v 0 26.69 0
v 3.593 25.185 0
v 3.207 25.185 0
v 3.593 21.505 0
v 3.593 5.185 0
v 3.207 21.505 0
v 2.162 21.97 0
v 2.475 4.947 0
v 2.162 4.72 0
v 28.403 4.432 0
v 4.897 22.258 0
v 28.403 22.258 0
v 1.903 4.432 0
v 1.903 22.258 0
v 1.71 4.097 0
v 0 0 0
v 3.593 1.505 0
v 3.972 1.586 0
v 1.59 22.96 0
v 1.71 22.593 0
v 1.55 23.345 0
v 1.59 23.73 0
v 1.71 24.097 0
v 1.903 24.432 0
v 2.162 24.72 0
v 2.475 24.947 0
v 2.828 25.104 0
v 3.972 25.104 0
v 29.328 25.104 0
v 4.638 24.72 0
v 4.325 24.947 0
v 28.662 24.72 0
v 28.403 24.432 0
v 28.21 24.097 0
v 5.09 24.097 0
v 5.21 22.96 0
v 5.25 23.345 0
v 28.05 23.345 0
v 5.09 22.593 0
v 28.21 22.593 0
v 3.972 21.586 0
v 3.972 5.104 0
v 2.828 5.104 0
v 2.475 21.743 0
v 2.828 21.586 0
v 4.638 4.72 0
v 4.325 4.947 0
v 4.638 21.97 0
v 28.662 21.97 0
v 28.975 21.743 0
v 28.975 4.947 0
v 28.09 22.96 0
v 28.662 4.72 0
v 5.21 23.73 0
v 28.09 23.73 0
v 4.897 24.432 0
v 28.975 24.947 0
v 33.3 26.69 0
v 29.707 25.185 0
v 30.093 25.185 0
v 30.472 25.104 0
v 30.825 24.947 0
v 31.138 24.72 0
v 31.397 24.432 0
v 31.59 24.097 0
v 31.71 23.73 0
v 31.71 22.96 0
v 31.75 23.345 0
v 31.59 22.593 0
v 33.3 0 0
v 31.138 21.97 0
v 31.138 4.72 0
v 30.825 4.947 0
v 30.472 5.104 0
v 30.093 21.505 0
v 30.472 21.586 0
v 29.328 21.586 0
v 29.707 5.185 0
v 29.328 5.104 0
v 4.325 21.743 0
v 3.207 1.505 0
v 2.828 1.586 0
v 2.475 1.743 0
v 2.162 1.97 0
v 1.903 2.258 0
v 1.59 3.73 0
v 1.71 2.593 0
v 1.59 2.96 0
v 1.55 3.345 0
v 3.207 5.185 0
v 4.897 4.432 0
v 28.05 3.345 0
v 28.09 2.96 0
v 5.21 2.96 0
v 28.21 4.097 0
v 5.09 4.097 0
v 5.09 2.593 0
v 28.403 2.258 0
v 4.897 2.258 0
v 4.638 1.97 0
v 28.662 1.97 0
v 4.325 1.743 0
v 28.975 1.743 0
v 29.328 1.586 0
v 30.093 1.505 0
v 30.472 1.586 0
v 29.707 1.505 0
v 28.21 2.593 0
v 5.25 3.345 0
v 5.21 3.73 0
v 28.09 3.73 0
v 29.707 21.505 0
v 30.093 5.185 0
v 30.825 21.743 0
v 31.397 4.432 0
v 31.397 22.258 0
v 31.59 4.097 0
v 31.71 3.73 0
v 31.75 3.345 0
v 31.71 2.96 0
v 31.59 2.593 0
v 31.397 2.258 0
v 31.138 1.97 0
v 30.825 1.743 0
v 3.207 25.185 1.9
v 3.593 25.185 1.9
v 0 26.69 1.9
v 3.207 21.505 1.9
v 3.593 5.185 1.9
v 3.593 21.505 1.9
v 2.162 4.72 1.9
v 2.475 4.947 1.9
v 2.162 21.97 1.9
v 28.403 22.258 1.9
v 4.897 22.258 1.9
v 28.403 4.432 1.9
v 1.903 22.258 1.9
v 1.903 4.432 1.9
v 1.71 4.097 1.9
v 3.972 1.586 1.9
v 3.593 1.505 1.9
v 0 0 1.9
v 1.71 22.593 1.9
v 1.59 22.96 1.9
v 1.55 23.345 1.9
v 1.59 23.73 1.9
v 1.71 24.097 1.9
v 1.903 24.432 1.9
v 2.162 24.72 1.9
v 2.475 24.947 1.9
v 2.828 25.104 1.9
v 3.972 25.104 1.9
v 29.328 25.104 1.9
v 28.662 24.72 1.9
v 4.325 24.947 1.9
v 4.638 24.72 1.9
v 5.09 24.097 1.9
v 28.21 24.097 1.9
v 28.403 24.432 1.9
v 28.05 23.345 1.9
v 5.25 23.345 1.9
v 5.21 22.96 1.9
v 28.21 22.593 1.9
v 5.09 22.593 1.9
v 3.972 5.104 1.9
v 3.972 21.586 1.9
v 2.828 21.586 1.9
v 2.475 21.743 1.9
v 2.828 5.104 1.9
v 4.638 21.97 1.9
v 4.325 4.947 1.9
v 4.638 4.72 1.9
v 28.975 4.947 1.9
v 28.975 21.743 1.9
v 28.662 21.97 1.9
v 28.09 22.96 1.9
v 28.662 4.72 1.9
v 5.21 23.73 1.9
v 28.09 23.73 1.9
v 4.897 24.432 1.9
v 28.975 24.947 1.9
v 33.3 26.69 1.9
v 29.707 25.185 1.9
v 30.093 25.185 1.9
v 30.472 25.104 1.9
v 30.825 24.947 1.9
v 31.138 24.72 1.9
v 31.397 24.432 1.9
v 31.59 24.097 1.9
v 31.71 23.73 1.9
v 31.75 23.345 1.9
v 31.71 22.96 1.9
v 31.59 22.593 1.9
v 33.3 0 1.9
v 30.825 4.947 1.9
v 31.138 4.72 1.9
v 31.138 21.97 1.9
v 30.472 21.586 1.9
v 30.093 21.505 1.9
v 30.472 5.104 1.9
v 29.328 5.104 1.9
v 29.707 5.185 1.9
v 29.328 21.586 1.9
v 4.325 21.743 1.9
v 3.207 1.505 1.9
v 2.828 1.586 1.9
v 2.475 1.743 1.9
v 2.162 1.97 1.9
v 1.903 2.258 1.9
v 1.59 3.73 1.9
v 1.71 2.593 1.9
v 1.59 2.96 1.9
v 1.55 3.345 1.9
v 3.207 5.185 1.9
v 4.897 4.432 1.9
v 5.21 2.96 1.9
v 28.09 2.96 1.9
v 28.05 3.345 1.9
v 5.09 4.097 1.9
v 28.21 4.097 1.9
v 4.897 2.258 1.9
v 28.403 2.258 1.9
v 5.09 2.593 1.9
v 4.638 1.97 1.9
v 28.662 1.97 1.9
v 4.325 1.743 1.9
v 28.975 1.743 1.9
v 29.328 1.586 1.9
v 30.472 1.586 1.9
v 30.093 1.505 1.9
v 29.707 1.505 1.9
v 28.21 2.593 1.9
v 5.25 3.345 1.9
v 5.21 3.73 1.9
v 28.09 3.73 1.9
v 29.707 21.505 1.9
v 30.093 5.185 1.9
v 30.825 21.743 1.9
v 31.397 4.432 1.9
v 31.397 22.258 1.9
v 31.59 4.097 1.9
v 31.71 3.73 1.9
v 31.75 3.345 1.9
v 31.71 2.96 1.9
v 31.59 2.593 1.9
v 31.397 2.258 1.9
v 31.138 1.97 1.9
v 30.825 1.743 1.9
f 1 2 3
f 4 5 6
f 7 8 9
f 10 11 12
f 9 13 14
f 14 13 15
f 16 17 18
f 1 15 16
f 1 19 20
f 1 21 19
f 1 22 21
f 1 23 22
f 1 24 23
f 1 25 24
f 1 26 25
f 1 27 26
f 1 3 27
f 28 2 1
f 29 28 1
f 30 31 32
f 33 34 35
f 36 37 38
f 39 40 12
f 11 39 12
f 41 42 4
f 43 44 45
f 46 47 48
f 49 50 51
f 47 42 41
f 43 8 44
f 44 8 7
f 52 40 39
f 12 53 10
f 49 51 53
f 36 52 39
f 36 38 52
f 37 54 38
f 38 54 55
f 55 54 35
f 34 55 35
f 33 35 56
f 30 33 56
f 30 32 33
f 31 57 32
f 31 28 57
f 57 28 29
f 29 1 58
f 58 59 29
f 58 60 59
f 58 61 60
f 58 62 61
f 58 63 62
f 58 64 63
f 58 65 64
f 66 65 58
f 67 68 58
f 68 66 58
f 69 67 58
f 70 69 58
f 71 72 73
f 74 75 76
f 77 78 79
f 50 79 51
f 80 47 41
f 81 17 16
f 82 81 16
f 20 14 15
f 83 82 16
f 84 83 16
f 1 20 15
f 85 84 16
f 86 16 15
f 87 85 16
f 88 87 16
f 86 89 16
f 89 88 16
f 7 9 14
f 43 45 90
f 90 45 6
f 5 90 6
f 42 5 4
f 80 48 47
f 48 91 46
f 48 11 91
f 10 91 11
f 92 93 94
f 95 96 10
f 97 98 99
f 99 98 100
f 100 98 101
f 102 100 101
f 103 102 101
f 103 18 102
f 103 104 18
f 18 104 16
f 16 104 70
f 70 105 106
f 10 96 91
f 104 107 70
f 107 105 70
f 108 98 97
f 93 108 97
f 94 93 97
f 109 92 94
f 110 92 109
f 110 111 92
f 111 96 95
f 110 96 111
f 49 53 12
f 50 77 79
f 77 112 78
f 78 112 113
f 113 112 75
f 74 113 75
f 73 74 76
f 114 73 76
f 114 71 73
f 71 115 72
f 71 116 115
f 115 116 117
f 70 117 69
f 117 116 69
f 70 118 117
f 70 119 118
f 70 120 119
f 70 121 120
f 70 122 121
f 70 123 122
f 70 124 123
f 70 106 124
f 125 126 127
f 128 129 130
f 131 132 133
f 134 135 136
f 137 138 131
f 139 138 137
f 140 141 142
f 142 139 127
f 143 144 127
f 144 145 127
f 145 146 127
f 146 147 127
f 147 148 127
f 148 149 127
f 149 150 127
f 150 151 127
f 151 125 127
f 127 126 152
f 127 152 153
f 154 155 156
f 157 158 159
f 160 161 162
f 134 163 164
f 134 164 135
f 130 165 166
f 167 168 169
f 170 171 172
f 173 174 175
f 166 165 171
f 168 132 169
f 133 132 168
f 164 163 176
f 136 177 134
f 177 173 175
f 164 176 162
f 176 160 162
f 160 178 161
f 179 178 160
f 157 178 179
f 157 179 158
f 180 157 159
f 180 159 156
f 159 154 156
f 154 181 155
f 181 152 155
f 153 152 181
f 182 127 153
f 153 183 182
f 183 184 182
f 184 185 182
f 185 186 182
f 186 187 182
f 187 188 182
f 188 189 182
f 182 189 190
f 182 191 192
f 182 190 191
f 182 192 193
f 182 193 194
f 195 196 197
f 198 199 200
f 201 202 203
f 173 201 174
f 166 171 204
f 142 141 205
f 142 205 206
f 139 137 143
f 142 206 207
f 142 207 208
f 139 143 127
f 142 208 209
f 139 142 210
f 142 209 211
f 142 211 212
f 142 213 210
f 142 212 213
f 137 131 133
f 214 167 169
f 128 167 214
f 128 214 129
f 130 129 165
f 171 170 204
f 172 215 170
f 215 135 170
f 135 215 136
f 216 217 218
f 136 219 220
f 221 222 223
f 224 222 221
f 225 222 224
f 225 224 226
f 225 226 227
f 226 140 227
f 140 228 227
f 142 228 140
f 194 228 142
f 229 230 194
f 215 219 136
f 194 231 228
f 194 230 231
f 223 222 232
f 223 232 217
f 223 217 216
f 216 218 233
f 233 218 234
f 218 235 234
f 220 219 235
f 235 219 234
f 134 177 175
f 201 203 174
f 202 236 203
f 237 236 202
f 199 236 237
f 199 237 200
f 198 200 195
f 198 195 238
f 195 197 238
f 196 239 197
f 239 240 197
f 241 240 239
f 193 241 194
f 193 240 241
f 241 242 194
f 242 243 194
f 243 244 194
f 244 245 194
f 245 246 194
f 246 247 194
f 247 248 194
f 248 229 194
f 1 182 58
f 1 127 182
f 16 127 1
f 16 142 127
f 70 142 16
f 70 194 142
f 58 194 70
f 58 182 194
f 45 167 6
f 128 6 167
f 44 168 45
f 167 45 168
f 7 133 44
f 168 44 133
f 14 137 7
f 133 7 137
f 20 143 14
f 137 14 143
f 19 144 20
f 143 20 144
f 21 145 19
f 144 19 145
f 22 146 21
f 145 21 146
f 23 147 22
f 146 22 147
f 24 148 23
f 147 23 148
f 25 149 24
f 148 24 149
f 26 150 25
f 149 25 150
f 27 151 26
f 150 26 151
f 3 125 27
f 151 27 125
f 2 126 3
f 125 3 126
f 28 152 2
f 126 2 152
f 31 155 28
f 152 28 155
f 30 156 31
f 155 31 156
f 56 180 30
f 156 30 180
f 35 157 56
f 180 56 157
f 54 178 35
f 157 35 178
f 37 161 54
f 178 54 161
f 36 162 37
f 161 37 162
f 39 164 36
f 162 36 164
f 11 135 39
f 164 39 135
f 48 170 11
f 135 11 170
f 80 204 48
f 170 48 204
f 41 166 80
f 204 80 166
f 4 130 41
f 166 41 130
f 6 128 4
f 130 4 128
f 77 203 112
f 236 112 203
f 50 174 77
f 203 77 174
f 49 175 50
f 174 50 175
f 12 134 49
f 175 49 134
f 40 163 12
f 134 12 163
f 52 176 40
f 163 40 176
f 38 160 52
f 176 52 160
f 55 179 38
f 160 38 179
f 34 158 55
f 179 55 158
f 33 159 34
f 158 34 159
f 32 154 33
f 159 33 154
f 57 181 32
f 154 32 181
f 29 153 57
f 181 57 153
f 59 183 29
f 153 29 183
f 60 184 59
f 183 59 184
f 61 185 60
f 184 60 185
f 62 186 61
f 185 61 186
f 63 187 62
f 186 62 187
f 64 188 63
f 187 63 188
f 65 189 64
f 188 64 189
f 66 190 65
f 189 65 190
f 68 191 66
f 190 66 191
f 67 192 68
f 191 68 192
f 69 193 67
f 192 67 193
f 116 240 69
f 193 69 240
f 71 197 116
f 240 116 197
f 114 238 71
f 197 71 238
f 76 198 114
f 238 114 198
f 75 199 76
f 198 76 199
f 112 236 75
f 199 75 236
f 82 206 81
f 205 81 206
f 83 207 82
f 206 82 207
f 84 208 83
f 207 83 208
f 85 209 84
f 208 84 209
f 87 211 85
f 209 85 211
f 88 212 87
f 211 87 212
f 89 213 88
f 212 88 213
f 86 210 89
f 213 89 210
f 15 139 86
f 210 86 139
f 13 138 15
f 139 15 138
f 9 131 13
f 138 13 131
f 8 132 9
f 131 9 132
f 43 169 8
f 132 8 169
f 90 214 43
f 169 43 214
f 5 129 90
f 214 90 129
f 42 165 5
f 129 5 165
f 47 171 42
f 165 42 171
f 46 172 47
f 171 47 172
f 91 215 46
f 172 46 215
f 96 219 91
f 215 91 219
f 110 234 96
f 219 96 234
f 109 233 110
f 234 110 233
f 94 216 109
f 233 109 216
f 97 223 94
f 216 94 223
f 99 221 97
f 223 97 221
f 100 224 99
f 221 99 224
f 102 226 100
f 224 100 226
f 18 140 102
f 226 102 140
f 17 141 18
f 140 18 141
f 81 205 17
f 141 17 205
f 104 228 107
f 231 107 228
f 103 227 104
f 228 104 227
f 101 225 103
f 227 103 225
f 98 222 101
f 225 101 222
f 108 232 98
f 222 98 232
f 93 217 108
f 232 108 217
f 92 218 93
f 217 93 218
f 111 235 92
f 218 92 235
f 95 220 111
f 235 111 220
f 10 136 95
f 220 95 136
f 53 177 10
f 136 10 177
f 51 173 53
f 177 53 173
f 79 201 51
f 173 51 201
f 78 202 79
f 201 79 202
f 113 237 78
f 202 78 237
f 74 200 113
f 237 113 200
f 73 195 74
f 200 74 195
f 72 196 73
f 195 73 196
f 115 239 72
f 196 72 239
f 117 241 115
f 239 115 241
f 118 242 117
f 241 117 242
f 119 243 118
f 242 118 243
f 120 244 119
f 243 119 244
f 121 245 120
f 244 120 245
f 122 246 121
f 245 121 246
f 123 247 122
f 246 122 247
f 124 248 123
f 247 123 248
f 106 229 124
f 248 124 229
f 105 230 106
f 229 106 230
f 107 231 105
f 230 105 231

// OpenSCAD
$fa = 1;
$fs = 0.4;
hole_radius=3.5/2+0.1;
holesep_x = 26.5;
holesep_y = 20;
base_width = 26.69;
base_length = 33.30;
linear_extrude(height=1.9 ,convexity=10)difference(){
		square([base_length ,base_width]);
		temp1 = (base_length-holesep_x)/2;
		temp2 = (base_width-holesep_y)/2;

    translate([temp1,temp2])circle(r=hole_radius);  
    translate([temp1+holesep_x,temp2])circle(r=hole_radius);  
    translate([temp1,temp2+holesep_y])circle(r=hole_radius);  
    translate([temp1+holesep_x,temp2+holesep_y])circle(r=hole_radius);  
}
